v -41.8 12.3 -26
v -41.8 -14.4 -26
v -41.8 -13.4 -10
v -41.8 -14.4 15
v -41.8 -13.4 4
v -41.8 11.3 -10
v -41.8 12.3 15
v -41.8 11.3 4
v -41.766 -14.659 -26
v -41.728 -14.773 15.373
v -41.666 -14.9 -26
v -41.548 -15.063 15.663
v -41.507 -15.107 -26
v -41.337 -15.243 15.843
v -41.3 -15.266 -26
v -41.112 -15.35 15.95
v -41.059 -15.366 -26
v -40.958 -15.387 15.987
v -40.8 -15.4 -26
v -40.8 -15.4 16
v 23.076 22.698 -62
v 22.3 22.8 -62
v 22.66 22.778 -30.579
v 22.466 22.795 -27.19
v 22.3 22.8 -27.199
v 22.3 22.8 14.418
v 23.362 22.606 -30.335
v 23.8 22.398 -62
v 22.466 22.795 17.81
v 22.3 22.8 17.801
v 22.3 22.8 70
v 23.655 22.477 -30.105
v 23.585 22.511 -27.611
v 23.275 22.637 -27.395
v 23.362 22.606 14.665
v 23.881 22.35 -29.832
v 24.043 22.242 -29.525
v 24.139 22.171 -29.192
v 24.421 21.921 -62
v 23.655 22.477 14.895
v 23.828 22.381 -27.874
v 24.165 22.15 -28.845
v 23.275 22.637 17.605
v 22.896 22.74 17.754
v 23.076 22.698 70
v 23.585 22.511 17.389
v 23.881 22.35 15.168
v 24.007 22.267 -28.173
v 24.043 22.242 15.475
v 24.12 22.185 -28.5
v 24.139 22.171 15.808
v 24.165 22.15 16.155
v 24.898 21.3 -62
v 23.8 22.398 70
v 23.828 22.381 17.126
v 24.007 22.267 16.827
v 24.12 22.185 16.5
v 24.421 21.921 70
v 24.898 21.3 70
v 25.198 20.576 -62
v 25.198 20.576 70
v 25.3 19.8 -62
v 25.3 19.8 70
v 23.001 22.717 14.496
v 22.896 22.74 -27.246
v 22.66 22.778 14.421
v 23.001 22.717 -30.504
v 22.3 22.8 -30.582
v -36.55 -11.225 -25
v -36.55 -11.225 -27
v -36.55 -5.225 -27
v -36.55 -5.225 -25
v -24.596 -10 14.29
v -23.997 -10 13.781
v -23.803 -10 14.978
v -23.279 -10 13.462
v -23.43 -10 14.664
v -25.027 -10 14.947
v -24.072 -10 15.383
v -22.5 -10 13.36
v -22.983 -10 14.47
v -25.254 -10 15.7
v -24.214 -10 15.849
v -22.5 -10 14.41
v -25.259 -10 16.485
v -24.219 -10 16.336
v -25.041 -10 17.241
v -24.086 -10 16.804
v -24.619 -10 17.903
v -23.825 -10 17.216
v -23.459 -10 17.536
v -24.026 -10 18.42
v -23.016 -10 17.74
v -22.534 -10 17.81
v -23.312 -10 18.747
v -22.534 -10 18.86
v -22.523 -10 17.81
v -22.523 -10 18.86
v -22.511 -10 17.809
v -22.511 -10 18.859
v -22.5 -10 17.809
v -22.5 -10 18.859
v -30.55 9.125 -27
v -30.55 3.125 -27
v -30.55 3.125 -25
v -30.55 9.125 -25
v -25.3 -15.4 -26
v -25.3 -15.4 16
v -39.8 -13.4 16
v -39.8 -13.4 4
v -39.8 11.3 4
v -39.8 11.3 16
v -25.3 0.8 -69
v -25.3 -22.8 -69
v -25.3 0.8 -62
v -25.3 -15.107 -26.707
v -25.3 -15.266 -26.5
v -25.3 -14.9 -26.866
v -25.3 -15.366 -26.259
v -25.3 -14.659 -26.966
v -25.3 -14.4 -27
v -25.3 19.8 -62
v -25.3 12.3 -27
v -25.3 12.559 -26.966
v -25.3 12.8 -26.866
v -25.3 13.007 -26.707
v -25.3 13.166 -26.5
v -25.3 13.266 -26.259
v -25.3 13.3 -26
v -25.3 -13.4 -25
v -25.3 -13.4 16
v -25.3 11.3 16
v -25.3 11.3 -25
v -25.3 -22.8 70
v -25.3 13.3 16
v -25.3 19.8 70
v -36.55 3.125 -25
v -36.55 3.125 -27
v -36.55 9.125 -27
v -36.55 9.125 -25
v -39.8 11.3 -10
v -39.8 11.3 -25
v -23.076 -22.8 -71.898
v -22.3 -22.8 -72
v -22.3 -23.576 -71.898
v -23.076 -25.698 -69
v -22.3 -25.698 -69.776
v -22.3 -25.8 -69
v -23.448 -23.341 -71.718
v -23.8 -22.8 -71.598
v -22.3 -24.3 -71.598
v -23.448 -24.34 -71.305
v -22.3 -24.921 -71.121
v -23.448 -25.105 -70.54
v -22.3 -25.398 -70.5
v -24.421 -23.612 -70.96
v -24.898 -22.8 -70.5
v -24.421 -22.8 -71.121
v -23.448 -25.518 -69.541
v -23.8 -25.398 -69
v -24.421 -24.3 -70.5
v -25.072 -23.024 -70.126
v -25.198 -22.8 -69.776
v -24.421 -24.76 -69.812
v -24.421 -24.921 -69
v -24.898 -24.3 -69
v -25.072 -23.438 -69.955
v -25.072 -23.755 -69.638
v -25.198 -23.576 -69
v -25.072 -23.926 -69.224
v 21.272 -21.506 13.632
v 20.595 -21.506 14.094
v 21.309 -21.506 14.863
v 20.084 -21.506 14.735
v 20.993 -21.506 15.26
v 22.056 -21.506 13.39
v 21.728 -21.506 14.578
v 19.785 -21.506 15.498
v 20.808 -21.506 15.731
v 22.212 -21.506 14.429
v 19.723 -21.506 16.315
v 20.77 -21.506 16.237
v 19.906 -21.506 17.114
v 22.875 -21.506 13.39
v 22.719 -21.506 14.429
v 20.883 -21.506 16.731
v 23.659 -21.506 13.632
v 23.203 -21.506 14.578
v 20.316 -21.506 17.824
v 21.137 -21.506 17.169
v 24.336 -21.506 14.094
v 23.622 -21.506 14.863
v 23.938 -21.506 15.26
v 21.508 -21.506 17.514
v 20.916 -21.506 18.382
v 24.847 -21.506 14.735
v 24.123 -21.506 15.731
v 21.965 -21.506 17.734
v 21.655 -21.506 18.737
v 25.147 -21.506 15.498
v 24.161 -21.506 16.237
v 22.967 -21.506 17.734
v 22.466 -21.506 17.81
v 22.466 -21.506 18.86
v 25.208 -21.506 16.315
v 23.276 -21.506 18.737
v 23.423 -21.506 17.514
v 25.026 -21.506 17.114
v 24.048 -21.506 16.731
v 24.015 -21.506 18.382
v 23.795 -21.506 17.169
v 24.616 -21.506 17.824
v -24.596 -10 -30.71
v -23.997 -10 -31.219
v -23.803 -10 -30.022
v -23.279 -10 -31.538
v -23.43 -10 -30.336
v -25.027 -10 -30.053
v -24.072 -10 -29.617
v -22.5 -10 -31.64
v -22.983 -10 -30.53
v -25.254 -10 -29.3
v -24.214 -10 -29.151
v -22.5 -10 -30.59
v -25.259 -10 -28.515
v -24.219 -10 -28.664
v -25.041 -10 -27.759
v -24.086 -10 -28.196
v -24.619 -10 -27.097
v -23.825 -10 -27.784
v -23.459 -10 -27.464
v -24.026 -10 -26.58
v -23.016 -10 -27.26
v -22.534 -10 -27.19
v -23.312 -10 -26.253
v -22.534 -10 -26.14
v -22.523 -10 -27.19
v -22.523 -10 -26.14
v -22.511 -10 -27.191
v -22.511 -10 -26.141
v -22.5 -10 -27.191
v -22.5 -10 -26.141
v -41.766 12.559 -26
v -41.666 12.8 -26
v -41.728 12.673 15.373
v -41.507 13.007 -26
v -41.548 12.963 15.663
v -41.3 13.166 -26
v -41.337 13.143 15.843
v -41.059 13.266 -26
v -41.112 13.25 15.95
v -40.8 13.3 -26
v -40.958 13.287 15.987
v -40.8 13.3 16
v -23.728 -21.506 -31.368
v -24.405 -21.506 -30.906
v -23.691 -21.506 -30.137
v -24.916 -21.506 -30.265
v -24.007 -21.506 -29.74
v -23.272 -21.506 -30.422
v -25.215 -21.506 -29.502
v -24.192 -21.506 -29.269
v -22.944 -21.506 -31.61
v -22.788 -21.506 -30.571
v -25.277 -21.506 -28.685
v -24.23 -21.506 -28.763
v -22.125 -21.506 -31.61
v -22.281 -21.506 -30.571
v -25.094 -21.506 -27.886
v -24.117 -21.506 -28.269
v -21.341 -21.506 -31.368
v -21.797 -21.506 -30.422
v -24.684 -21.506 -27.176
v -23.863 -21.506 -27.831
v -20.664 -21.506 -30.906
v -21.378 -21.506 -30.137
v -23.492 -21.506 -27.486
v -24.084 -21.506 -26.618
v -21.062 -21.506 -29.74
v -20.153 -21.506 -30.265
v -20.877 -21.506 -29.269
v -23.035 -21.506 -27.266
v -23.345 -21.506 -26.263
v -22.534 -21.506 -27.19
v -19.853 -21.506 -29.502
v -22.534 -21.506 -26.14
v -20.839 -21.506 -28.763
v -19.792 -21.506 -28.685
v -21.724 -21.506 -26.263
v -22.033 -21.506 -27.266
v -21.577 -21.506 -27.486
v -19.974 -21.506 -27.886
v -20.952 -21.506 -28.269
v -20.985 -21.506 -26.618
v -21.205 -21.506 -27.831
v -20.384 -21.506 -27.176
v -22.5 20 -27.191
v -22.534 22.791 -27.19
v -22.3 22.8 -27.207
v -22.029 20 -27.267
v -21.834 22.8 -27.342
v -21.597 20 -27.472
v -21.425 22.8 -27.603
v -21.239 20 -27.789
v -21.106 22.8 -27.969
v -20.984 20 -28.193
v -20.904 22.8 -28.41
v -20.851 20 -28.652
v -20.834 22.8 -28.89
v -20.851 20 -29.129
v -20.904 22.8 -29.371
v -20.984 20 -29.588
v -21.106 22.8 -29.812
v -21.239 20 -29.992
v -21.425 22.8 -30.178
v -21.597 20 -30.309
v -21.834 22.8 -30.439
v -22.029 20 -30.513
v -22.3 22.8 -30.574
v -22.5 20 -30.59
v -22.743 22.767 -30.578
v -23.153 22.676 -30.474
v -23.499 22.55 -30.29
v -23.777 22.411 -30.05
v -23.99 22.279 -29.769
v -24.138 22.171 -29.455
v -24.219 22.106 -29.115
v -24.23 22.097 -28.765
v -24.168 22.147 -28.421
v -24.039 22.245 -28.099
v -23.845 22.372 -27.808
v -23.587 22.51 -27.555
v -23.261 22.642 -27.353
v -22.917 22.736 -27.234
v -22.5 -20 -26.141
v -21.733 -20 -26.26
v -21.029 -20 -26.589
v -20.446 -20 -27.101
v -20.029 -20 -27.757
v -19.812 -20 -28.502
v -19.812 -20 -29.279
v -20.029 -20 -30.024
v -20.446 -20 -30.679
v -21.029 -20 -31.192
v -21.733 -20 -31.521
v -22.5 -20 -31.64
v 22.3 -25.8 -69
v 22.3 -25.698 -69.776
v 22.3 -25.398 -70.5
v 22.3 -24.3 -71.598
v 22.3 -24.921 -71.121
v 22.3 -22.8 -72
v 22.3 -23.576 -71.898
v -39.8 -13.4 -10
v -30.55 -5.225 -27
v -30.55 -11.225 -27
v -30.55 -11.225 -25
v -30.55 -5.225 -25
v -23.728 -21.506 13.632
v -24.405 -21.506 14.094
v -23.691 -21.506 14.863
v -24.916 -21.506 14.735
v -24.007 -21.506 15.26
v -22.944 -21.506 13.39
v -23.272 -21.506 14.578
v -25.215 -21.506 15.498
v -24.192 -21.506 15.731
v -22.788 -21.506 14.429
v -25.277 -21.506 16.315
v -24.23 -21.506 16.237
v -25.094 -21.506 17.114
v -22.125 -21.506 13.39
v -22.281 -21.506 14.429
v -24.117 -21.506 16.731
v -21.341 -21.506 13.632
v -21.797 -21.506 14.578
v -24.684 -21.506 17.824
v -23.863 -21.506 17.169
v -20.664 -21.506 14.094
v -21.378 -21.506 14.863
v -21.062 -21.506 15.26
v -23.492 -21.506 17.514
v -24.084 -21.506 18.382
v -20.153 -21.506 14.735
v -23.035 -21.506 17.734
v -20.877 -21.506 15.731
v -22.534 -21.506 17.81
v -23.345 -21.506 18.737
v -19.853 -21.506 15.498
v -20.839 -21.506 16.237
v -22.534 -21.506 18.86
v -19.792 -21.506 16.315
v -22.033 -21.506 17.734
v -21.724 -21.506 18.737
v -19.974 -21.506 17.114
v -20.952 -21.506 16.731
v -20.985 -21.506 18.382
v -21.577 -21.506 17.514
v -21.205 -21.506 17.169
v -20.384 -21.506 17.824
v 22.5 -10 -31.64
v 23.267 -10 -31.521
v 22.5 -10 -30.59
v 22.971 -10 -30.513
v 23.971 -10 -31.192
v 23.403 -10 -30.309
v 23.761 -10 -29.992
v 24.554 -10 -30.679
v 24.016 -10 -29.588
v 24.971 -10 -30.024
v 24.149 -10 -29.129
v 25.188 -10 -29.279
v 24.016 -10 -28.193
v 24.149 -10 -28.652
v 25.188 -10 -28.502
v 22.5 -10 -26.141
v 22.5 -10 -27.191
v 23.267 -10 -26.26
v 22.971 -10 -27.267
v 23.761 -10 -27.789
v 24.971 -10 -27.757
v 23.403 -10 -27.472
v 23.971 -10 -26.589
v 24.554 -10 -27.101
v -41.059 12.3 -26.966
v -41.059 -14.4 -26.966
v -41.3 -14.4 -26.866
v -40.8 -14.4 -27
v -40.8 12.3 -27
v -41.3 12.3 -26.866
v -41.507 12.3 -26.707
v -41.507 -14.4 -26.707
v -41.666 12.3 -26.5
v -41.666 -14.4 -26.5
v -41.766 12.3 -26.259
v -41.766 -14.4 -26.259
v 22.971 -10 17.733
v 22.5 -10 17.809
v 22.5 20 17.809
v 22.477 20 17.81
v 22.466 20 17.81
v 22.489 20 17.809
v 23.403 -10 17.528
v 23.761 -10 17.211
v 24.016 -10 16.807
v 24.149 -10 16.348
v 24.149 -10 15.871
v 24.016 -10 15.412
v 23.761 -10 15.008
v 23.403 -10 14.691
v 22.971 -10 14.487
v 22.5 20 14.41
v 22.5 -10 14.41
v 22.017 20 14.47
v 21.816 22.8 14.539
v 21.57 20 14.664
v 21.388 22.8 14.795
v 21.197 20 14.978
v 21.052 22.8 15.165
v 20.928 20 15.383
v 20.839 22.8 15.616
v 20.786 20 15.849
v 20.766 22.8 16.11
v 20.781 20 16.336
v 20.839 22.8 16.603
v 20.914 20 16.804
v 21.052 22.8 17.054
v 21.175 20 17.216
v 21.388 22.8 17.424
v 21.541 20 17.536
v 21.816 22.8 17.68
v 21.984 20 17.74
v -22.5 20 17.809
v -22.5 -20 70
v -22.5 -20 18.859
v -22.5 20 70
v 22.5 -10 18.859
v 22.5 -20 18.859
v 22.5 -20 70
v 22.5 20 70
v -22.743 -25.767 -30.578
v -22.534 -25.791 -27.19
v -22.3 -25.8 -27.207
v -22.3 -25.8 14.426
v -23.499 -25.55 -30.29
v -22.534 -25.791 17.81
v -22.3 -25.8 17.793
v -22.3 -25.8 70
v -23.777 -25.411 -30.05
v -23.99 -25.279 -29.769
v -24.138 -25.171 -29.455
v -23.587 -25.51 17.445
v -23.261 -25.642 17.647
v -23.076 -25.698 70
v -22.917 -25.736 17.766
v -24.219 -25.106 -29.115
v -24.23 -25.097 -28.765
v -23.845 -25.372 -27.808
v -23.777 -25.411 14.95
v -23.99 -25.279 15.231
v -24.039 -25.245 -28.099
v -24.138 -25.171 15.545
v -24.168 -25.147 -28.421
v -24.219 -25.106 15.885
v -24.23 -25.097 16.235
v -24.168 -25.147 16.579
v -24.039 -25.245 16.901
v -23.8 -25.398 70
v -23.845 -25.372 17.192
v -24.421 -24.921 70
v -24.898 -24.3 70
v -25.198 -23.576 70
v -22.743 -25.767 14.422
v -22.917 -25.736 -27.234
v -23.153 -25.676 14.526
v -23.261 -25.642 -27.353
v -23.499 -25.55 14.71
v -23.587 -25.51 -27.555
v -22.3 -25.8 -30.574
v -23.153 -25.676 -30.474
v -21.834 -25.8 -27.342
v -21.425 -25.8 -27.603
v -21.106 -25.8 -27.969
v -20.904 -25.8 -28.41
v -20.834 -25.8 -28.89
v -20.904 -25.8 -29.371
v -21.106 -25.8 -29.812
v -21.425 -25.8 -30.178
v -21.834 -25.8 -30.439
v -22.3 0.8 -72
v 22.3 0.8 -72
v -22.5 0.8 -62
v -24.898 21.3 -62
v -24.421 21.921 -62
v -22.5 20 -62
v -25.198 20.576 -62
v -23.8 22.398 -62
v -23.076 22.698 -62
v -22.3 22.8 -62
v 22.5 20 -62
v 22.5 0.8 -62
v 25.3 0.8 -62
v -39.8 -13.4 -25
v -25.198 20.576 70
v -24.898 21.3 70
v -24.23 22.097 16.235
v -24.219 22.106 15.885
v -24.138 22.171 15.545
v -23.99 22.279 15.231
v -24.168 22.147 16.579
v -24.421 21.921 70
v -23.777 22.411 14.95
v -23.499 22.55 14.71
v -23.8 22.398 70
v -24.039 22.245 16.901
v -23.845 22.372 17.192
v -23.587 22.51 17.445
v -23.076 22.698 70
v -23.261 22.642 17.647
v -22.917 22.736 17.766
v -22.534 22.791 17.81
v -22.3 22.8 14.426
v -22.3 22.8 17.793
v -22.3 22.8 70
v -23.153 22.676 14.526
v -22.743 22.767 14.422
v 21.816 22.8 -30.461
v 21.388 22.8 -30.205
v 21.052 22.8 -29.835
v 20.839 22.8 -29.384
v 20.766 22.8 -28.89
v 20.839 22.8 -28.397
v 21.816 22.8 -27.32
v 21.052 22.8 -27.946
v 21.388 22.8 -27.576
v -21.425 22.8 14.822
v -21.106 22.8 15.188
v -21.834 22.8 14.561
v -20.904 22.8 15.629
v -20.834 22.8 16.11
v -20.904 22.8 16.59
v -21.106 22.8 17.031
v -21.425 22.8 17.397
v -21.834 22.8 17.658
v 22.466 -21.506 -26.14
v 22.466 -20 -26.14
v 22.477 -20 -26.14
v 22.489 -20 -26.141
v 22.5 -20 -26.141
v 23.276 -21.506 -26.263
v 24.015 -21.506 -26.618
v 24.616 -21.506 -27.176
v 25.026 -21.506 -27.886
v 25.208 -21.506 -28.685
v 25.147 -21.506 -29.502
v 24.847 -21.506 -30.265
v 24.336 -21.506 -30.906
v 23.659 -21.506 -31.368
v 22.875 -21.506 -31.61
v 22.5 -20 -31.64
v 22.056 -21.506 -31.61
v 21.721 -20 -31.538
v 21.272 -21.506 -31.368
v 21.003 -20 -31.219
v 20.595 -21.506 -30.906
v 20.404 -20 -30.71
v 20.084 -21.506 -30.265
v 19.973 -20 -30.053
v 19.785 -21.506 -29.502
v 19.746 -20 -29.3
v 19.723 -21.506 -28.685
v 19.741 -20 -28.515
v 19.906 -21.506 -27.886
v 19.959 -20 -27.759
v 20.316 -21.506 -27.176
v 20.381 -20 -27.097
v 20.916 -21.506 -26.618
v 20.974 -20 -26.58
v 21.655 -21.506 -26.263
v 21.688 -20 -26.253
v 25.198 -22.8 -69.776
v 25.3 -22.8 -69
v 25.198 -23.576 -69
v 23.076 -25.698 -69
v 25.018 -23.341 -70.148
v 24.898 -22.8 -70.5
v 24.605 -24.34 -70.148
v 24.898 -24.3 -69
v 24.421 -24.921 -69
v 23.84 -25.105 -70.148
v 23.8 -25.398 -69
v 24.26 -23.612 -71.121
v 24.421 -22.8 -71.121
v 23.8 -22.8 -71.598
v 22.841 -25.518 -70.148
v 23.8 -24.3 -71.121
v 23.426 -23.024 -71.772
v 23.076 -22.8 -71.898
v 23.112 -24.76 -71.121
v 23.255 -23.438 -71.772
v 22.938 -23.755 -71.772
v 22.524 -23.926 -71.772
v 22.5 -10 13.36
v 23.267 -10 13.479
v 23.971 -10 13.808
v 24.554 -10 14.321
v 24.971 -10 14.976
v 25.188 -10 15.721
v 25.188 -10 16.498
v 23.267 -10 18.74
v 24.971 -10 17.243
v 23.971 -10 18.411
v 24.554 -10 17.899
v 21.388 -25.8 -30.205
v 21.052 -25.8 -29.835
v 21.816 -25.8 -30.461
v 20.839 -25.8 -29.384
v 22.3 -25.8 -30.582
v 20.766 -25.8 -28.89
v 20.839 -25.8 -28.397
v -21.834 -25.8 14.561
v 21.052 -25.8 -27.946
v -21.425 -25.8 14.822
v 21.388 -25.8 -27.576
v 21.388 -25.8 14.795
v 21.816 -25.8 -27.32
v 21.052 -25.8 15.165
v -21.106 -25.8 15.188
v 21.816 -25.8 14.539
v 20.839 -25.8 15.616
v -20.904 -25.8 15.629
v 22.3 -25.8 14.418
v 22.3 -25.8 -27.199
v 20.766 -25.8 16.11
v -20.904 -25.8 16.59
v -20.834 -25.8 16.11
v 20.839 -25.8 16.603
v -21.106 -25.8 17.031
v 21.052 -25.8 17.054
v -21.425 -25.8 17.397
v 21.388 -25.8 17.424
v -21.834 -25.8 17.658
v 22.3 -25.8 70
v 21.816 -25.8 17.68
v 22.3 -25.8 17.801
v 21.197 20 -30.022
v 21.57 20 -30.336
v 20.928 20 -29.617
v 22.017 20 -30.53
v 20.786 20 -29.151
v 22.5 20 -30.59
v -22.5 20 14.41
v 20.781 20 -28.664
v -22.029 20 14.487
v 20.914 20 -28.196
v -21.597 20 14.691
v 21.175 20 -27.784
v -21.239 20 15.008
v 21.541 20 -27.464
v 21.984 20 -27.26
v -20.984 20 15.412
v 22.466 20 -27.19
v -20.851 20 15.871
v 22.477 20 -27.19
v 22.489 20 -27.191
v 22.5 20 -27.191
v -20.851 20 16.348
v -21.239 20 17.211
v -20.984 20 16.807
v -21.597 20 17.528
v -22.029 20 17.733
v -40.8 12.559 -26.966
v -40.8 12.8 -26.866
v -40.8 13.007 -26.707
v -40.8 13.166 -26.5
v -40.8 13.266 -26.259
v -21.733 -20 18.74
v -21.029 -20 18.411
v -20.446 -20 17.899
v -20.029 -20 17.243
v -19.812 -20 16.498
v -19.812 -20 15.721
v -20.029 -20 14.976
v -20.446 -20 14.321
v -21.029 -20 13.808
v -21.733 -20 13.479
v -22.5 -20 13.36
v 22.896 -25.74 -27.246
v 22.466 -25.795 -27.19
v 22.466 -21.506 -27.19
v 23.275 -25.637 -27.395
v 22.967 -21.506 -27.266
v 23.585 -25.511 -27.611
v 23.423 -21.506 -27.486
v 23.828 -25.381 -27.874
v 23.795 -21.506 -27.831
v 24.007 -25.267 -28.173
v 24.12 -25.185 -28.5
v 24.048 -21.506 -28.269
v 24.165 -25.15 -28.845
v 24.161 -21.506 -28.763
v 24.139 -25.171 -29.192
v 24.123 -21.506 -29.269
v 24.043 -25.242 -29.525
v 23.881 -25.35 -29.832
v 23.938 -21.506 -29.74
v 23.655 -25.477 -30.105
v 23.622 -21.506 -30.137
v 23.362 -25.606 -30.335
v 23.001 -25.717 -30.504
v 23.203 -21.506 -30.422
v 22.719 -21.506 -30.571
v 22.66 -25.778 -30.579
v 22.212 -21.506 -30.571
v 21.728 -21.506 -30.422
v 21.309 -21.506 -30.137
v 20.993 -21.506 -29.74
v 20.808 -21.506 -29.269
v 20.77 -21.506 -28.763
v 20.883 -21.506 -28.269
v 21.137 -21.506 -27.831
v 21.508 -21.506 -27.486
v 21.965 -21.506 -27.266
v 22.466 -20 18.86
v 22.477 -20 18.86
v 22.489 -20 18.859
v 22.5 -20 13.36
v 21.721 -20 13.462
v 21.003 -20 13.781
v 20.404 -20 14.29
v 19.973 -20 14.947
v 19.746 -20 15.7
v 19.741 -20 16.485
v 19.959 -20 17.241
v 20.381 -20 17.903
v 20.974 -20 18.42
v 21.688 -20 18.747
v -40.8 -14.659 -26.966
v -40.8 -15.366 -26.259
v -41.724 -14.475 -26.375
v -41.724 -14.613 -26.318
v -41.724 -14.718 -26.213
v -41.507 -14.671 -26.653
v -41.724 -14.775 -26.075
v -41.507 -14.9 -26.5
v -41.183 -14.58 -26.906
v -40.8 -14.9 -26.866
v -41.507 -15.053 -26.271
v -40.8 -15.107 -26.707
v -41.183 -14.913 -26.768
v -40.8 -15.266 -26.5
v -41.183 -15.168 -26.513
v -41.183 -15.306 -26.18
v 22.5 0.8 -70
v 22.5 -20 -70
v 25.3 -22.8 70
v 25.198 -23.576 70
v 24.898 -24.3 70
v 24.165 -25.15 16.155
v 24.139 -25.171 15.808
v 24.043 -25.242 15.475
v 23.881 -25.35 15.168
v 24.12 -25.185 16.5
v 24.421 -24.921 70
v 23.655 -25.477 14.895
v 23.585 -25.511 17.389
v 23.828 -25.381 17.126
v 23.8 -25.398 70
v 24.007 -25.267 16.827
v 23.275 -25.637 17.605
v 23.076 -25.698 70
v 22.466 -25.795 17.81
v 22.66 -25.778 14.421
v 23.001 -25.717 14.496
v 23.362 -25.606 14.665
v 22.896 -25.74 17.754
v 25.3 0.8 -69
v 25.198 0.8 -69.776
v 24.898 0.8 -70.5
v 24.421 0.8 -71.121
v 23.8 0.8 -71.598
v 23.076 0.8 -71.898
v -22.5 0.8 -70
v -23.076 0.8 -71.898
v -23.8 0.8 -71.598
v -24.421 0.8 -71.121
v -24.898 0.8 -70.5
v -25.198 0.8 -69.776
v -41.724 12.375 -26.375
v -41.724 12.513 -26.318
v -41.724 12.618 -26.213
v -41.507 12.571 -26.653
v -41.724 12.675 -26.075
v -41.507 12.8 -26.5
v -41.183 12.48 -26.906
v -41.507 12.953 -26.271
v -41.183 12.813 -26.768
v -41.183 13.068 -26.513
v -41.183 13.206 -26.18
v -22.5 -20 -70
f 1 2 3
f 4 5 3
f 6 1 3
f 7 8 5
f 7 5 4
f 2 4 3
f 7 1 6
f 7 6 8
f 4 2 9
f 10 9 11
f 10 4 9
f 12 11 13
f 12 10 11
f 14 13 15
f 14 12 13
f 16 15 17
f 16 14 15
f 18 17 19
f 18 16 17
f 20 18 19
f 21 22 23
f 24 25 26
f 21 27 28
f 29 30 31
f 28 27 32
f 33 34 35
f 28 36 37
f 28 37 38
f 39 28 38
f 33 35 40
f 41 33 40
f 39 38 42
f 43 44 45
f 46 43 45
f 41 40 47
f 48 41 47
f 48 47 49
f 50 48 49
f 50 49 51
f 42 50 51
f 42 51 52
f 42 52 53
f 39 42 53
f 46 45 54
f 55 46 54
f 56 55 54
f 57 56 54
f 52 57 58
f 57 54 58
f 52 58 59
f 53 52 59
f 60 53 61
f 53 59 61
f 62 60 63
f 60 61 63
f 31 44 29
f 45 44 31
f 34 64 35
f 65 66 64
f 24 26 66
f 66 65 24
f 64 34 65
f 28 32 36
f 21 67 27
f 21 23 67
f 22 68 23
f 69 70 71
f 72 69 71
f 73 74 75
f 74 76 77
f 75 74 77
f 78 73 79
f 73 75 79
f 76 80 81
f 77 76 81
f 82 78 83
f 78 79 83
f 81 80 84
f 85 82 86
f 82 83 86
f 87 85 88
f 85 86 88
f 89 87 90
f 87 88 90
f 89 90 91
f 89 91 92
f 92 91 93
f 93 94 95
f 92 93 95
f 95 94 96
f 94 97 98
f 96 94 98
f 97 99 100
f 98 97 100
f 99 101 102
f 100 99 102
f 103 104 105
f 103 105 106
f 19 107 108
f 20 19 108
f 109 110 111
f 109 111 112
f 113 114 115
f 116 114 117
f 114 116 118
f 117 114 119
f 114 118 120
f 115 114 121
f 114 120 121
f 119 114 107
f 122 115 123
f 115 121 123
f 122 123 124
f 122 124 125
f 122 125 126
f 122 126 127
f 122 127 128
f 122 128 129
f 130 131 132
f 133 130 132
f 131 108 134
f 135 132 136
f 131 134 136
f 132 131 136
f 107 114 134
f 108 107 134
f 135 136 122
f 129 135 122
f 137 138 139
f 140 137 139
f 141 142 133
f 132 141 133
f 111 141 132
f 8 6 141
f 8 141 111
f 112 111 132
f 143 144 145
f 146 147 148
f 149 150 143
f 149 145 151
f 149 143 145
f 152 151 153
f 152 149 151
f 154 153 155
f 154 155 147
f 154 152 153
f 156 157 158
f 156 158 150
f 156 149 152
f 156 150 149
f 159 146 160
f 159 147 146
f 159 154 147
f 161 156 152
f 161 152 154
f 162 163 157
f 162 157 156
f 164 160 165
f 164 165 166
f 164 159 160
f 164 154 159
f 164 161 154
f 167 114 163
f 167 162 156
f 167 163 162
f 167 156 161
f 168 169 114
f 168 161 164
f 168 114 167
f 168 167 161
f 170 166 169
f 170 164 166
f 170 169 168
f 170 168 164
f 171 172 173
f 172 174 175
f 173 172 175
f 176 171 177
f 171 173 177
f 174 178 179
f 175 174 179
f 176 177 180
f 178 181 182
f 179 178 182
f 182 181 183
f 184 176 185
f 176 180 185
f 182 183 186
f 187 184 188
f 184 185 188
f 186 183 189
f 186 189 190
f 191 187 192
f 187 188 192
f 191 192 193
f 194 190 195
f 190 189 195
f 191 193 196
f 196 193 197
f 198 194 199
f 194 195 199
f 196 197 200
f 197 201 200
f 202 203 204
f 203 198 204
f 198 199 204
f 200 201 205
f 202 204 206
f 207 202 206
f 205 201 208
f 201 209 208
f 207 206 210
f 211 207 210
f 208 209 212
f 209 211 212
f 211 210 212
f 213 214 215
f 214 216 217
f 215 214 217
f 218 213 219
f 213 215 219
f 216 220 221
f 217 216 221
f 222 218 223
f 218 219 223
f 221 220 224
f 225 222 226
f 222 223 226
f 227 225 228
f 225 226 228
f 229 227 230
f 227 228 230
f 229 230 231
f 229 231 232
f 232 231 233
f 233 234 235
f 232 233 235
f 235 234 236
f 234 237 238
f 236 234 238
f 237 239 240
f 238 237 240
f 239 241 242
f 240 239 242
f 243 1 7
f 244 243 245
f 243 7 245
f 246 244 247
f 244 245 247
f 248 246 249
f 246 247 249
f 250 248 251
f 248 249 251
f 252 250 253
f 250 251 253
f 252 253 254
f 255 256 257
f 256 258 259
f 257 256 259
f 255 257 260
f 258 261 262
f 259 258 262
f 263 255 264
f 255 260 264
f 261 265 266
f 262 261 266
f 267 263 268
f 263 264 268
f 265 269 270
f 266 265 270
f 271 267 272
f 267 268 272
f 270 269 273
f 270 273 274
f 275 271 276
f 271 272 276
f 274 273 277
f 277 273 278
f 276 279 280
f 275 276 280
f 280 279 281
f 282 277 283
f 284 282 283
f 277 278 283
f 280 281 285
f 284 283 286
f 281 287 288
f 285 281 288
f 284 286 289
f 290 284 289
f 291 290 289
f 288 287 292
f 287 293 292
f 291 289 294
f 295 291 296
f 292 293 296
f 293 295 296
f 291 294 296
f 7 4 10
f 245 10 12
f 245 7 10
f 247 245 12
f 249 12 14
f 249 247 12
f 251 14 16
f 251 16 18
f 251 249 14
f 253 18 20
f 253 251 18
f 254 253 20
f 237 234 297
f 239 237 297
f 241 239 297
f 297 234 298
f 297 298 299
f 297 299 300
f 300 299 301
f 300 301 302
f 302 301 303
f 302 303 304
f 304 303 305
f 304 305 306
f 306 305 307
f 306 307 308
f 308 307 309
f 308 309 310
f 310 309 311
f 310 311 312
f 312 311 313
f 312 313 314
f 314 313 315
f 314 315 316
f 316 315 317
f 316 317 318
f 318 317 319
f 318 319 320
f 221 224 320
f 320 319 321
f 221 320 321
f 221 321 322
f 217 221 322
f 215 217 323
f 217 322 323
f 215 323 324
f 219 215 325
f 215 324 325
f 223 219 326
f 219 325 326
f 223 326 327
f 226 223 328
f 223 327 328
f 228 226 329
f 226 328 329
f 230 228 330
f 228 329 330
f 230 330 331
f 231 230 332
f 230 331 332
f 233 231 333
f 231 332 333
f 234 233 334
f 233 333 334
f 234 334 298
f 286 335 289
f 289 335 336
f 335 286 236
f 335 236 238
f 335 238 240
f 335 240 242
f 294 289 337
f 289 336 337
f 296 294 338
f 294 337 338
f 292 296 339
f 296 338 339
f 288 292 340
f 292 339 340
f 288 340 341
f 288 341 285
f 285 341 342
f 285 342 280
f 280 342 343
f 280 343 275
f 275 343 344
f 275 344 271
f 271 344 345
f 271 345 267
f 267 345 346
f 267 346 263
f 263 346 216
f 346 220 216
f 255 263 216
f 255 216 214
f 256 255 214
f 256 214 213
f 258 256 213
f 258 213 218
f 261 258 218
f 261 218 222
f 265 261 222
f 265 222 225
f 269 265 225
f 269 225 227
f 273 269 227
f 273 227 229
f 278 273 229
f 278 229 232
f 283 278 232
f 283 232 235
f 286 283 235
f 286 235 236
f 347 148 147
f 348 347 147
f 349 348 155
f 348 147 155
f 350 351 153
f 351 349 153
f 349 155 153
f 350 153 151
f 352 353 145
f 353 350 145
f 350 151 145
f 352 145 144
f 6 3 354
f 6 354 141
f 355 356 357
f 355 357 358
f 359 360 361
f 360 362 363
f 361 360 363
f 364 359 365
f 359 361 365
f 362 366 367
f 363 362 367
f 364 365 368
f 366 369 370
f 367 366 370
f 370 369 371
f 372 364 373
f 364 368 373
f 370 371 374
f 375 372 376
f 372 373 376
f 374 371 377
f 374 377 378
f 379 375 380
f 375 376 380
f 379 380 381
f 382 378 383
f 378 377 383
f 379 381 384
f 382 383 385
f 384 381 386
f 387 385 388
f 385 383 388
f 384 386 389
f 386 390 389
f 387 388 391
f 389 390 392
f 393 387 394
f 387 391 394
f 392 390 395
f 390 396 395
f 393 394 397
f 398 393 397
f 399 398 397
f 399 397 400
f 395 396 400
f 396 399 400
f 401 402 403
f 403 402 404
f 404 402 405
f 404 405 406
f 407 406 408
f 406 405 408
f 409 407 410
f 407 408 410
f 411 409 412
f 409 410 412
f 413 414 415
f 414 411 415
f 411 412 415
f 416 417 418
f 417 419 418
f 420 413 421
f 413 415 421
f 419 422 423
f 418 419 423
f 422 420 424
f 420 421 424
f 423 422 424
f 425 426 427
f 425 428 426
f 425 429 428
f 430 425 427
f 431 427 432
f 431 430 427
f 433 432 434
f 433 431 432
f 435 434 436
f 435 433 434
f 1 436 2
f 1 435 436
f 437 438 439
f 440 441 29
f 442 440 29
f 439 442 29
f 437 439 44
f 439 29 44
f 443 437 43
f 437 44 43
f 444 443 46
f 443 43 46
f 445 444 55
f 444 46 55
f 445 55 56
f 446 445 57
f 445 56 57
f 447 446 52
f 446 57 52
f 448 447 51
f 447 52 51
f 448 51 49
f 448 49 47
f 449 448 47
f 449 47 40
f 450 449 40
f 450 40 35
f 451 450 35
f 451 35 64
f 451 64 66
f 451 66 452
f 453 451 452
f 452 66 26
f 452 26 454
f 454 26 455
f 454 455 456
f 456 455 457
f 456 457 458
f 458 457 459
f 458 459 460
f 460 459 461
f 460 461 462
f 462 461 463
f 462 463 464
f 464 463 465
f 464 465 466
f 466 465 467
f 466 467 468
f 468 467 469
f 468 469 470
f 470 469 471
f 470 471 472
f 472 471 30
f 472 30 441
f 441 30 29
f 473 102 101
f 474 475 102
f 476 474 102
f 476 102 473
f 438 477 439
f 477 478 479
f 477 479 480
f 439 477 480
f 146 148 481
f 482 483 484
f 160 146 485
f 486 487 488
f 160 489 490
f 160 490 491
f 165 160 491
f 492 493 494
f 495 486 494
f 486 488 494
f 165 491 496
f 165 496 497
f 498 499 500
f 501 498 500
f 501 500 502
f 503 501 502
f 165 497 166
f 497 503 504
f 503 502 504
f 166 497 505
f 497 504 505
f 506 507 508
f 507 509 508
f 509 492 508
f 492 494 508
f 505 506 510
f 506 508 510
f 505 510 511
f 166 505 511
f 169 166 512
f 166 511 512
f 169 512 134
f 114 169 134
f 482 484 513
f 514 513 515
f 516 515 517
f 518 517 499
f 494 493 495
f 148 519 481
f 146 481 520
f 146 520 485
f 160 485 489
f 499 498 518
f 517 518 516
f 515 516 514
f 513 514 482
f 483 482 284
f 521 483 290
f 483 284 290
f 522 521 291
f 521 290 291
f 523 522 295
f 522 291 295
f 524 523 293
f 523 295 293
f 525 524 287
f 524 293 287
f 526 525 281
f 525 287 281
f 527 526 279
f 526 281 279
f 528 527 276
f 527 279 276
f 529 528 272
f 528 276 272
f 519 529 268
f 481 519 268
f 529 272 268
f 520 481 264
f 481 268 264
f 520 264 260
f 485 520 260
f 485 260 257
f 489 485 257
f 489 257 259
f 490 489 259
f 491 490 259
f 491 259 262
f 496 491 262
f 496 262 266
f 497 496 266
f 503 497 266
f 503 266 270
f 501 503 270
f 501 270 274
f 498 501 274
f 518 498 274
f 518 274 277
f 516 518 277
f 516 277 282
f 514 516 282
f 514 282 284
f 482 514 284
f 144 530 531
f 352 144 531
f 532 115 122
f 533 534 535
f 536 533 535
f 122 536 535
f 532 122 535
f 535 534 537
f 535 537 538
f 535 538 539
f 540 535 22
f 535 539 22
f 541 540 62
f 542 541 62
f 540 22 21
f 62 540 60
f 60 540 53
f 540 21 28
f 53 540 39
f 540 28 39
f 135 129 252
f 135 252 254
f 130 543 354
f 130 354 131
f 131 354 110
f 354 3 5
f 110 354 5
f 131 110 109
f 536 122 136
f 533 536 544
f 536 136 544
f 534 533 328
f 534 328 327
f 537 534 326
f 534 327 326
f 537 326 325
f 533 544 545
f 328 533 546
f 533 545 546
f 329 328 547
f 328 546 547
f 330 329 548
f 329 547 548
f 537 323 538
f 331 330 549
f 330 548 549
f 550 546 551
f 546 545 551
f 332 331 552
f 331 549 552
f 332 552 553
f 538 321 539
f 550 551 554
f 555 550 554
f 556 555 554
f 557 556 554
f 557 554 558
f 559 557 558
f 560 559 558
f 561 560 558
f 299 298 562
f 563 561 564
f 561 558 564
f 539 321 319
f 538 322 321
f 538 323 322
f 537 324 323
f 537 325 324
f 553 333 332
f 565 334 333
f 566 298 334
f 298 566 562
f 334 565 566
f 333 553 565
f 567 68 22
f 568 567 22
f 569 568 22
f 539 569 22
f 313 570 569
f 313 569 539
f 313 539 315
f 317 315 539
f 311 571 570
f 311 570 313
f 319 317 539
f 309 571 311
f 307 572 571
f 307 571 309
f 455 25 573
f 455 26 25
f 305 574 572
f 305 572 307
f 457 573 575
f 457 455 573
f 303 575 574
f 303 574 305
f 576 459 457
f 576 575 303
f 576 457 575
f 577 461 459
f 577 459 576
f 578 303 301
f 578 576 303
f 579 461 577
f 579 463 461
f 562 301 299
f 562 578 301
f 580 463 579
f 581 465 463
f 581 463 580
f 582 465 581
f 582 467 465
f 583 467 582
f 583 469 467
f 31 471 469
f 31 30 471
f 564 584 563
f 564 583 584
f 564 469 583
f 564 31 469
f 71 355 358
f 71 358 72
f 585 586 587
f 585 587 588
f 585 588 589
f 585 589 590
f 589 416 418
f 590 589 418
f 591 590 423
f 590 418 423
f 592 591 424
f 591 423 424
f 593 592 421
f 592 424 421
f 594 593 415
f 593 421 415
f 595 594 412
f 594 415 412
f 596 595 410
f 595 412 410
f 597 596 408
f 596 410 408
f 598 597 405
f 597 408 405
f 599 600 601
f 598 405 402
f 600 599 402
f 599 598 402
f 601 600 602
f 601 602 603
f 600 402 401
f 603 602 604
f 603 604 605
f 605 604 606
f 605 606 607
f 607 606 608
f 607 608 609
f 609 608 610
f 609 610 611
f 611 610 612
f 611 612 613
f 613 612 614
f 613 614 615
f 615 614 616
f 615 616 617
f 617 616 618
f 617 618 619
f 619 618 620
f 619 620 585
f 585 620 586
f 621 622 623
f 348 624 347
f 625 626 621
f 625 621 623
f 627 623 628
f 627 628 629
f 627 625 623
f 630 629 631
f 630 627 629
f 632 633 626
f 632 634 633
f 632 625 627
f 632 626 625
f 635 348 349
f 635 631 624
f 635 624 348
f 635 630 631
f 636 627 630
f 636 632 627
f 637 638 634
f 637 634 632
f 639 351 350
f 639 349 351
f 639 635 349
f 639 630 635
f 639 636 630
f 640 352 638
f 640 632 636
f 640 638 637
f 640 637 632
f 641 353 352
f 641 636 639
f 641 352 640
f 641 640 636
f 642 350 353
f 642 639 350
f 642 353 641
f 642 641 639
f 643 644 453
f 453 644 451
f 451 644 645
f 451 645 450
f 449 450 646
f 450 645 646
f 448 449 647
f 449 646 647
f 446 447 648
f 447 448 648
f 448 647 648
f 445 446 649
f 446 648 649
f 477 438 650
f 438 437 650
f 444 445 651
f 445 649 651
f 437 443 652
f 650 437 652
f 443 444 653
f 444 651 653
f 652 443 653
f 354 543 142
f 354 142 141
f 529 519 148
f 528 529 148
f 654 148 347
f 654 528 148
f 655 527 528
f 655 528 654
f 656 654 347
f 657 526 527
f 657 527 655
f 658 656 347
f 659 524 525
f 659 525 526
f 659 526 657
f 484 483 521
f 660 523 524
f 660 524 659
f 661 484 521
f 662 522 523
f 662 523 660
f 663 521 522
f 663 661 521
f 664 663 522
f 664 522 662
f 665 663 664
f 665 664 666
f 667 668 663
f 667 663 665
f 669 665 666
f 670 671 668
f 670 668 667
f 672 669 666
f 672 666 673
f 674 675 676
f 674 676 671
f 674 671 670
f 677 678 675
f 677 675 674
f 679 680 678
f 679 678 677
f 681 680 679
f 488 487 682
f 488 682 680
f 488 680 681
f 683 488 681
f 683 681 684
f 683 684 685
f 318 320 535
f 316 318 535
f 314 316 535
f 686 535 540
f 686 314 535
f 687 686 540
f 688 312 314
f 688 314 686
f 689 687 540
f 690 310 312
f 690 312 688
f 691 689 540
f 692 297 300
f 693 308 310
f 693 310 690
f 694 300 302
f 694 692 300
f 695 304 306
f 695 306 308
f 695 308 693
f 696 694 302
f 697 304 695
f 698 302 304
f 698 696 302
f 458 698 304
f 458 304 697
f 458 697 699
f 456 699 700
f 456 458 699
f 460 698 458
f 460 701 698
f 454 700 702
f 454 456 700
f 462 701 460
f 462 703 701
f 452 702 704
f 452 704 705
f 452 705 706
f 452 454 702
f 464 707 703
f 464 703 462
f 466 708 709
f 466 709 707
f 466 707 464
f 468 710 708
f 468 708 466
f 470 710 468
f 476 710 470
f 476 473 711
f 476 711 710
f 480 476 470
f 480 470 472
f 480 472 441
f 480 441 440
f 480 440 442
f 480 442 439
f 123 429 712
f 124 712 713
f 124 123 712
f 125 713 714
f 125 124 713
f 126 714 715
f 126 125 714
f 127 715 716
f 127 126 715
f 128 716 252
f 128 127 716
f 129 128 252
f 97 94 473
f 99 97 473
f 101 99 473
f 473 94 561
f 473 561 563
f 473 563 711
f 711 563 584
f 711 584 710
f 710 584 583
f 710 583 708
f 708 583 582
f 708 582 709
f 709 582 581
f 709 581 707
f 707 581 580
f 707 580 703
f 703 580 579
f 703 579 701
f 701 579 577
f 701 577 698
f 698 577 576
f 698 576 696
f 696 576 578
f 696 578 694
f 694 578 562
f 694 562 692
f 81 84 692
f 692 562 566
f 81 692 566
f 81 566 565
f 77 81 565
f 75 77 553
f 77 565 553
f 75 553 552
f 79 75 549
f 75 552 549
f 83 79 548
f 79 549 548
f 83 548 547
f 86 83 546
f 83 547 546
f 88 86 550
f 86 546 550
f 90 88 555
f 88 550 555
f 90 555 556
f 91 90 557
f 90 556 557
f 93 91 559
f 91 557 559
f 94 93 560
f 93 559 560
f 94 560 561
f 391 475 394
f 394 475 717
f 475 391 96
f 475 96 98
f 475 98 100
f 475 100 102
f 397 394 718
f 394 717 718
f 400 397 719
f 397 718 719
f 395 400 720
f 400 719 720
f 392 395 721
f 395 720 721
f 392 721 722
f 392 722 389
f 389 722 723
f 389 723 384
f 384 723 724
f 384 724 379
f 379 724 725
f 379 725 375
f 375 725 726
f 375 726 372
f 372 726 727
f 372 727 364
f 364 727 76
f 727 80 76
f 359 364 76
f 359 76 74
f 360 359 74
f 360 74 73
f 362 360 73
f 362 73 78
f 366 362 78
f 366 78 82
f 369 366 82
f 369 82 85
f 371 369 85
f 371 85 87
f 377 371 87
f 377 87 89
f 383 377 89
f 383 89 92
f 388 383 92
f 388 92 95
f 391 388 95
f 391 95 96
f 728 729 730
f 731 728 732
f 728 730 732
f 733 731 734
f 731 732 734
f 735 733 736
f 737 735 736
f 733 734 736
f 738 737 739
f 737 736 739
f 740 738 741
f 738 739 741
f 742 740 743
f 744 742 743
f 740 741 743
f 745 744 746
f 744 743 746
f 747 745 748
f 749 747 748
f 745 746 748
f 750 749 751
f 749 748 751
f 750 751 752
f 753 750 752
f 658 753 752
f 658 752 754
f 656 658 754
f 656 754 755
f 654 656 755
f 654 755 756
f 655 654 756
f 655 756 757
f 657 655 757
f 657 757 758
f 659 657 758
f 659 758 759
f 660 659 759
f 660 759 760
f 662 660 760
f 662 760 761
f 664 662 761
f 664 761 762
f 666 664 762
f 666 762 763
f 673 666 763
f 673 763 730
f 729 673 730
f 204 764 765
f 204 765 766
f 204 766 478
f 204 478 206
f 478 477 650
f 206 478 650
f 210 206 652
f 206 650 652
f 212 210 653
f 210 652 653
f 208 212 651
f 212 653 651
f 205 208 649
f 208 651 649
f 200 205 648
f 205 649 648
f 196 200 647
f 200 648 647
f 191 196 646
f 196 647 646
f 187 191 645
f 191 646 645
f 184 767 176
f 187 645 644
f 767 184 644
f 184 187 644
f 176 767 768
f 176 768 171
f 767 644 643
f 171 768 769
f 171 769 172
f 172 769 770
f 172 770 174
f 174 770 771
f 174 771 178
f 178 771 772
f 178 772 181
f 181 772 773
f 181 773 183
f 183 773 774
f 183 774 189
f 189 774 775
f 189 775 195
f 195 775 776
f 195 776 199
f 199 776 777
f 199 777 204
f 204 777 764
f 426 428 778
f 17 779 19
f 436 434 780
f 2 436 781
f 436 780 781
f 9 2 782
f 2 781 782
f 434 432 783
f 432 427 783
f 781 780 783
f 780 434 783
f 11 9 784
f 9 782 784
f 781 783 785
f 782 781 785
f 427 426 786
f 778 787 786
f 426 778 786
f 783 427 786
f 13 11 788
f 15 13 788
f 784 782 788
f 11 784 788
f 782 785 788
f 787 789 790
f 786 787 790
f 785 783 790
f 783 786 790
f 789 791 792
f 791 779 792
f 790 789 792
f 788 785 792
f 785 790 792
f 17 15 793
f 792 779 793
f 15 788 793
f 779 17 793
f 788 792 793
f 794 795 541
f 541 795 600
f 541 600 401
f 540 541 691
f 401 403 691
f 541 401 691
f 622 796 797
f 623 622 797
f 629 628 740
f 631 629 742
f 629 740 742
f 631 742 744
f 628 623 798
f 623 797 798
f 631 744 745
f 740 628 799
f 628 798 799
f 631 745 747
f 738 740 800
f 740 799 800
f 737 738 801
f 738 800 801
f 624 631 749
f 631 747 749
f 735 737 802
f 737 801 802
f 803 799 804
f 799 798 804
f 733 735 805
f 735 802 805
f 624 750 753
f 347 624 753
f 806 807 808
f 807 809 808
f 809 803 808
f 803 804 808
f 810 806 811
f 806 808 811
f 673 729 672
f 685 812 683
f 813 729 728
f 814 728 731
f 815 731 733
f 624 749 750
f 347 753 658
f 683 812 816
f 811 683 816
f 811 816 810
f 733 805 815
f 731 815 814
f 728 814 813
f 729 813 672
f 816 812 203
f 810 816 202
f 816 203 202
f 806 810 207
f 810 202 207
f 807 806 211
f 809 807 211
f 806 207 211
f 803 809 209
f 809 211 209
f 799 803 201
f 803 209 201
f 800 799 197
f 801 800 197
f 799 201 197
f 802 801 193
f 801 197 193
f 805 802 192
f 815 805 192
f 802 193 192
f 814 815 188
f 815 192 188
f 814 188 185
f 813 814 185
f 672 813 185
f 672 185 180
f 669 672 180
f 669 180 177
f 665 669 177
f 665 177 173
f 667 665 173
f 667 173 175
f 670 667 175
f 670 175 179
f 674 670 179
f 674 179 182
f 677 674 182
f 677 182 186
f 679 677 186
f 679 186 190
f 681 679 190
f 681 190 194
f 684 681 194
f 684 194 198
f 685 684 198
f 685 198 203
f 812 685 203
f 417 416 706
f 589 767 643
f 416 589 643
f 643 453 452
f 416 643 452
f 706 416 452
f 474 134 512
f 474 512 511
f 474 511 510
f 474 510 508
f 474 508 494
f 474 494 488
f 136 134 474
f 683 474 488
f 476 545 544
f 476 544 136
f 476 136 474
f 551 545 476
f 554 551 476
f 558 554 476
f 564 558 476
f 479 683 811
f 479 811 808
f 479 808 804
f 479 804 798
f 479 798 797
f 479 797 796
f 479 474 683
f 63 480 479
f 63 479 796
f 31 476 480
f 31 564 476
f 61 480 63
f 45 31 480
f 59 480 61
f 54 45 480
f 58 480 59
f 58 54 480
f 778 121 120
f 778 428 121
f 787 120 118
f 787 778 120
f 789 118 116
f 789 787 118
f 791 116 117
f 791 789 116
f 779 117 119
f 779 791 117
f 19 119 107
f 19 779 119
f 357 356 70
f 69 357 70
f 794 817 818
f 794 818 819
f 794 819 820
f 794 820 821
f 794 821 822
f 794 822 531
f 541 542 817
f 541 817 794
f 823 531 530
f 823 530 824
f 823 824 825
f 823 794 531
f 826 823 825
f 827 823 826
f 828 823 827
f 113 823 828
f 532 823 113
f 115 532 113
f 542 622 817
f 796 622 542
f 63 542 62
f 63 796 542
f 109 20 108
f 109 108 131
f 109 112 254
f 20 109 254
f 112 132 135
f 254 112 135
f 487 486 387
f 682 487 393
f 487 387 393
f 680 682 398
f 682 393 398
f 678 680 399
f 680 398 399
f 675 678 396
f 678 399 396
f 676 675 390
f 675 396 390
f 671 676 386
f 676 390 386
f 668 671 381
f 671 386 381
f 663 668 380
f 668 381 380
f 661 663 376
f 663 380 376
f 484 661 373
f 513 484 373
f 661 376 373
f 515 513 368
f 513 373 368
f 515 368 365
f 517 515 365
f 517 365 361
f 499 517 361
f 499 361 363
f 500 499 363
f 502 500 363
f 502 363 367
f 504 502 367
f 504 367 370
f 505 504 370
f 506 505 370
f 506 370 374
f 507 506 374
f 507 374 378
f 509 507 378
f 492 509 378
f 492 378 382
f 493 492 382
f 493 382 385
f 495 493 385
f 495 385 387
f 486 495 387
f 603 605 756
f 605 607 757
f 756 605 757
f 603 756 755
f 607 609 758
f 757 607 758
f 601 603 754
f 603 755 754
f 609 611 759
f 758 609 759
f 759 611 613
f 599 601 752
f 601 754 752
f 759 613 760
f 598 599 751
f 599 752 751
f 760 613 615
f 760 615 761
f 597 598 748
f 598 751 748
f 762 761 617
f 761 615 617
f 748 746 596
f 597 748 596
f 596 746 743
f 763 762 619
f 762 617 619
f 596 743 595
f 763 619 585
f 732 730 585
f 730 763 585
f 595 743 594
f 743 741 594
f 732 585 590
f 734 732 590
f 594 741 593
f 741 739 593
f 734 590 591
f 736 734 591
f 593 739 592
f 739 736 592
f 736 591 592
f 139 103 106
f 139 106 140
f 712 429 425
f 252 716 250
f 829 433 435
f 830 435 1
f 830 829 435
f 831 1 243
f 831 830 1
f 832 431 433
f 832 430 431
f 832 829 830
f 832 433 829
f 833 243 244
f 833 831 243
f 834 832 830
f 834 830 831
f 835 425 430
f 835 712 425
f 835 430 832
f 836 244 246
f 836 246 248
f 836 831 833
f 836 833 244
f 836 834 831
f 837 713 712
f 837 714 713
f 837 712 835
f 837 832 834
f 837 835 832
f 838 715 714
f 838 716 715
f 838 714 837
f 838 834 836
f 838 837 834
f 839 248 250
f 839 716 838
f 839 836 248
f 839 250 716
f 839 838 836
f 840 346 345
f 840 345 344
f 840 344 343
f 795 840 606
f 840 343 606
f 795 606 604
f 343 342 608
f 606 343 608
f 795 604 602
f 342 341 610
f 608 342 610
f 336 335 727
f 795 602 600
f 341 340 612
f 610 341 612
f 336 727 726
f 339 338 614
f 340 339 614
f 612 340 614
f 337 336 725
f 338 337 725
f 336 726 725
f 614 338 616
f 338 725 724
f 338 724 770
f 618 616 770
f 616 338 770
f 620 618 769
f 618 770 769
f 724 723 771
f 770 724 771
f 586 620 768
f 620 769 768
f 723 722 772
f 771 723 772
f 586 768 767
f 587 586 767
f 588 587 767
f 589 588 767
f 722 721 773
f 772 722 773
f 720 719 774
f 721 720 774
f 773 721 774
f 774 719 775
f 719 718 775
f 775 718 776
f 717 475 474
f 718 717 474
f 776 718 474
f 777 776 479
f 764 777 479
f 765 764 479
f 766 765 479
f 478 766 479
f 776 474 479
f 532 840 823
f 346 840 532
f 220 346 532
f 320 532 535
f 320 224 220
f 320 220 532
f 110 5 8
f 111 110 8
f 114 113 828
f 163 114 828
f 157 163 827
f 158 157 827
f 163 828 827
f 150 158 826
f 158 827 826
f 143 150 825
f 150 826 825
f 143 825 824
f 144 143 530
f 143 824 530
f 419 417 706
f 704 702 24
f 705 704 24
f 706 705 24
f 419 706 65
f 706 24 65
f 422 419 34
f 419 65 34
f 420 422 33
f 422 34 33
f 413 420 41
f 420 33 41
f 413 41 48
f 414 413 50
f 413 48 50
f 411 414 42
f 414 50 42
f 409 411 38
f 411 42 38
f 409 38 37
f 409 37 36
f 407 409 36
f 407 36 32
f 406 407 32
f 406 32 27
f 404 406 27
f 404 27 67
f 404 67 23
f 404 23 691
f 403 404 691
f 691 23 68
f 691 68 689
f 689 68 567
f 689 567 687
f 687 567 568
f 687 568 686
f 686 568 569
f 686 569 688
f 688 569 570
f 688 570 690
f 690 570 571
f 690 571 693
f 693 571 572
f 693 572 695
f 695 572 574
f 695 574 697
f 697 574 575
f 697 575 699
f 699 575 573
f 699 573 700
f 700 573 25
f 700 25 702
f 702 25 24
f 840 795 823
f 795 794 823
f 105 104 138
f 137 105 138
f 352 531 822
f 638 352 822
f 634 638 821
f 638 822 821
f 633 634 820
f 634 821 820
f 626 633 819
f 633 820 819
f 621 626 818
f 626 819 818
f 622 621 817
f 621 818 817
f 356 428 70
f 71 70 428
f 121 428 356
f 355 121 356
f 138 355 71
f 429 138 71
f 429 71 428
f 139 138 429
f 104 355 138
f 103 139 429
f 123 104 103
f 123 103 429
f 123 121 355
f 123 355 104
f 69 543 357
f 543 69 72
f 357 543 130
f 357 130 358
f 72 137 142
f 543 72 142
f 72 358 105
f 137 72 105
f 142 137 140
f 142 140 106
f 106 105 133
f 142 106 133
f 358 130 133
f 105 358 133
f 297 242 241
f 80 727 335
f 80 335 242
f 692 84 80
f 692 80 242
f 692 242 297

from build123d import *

# Parameters (mm, degrees)
SKETCH1_W           = 50.6
SKETCH1_H           = 45.6
SKETCH1_W_2         = 45
SKETCH1_H_2         = 40
BOSS_EXTRUDE1_DEPTH = 70
SKETCH2_W           = 50.6
SKETCH2_H           = 45.6
BOSS_EXTRUDE2_DEPTH = 2
SKETCH4_R           = 1.7
CUT_EXTRUDE1_DEPTH  = 71.5
SKETCH5_R           = 2.75
CUT_EXTRUDE2_DEPTH  = 12.5
SKETCH6_W           = 50.6
SKETCH6_H           = 4.293520681
BOSS_EXTRUDE3_DEPTH = 142
SKETCH7_R           = 1.7
CUT_EXTRUDE3_DEPTH  = 7.5
FILLET1_R           = 3
CUT_EXTRUDE4_DEPTH  = 22
BOSS_EXTRUDE4_DEPTH = 14.5
SKETCH10_W          = 43
SKETCH10_H          = 28.7
BOSS_EXTRUDE5_DEPTH = 2
SKETCH11_W          = 14
SKETCH11_H          = 24.7
CUT_EXTRUDE5_DEPTH  = 2
SKETCH12_W          = 6
SKETCH12_H          = 6
CUT_EXTRUDE6_DEPTH  = 2
FILLET2_R           = 1


with BuildPart() as part:
    # Sketch1 → Boss-Extrude1 (new, symmetric)
    with BuildSketch(Plane.XY):
        Rectangle(SKETCH1_W, SKETCH1_H)
        Rectangle(SKETCH1_W_2, SKETCH1_H_2, mode=Mode.SUBTRACT)
    extrude(amount=BOSS_EXTRUDE1_DEPTH, both=True)

    # Sketch2 → Boss-Extrude2 (add)
    with BuildSketch(Plane(origin=(0, 0, -70), x_dir=(-1, 0, 0), z_dir=(0, 0, -1))):
        Rectangle(SKETCH2_W, SKETCH2_H)
    extrude(amount=BOSS_EXTRUDE2_DEPTH)

    # Sketch4 → Cut-Extrude1 (cut)
    with BuildSketch(Plane(origin=(0, 22.8, 0), x_dir=(1, 0, 0), z_dir=(0, 1, 0))):
        with Locations(Location((-22.534370918, 28.890457594, 0), (0, 0, 270))):
            Circle(SKETCH4_R)
        with Locations(Location((22.465629082, 28.890457594, 0), (0, 0, 270))):
            Circle(SKETCH4_R)
        with Locations(Location((22.465629082, -16.109542406, 0), (0, 0, 270))):
            Circle(SKETCH4_R)
        with Locations(Location((-22.534370918, -16.109542406, 0), (0, 0, 270))):
            Circle(SKETCH4_R)
    extrude(amount=-CUT_EXTRUDE1_DEPTH, mode=Mode.SUBTRACT)

    # Sketch5 → Cut-Extrude2 (cut)
    with BuildSketch(Plane(origin=(0, -10, 0), x_dir=(1, 0, 0), z_dir=(0, 1, 0))):
        with Locations(Location((22.465629082, 28.890457594, 0), (0, 0, 270))):
            Circle(SKETCH5_R)
        with Locations(Location((22.465629082, -16.109542406, 0), (0, 0, 270))):
            Circle(SKETCH5_R)
        with Locations(Location((-22.534370918, 28.890457594, 0), (0, 0, 270))):
            Circle(SKETCH5_R)
        with Locations(Location((-22.534370918, -16.109542406, 0), (0, 0, 270))):
            Circle(SKETCH5_R)
    extrude(amount=-CUT_EXTRUDE2_DEPTH, mode=Mode.SUBTRACT)

    # Sketch6 → Boss-Extrude3 (add)
    with BuildSketch(Plane.XY.offset(70)):
        with Locations((0, -23.65323966)):
            Rectangle(SKETCH6_W, SKETCH6_H)
    extrude(amount=-BOSS_EXTRUDE3_DEPTH)

    # Sketch7 → Cut-Extrude3 (cut)
    with BuildSketch(Plane(origin=(0, -21.506479319, 0), x_dir=(1, 0, 0), z_dir=(0, 1, 0))):
        with Locations(Location((-22.534370918, 28.890457594, 0), (0, 0, 270))):
            Circle(SKETCH7_R)
        with Locations(Location((22.465629082, 28.890457594, 0), (0, 0, 270))):
            Circle(SKETCH7_R)
        with Locations(Location((22.465629082, -16.109542406, 0), (0, 0, 270))):
            Circle(SKETCH7_R)
        with Locations(Location((-22.534370918, -16.109542406, 0), (0, 0, 270))):
            Circle(SKETCH7_R)
    extrude(amount=-CUT_EXTRUDE3_DEPTH, mode=Mode.SUBTRACT)

    # Fillet1
    # the kernel refuses this fillet: 3 mm, written as the material it takes off along each edge
    with BuildSketch(Plane(origin=(-22.3, -22.8, -69), x_dir=(0, 0, -1), z_dir=(-1, 0, 0))) as fillet1_piece_1_section:
        Polygon((0, 0), (FILLET1_R, 0), (FILLET1_R, FILLET1_R), (0, FILLET1_R), align=None)
    fillet1_piece_1 = extrude(amount=FILLET1_R, mode=Mode.PRIVATE)
    fillet1_piece_1 = fillet1_piece_1 - Plane(origin=(-22.3, -22.8, -69), x_dir=(-2.085182079516792e-15, 0.7071067811865475, 0.7071067811865475), z_dir=(-1, 0, 0)) * Sphere(FILLET1_R, mode=Mode.PRIVATE)
    add(fillet1_piece_1, mode=Mode.SUBTRACT)
    with BuildSketch(Plane(origin=(22.3, -22.8, -69), x_dir=(0, -1, 0), z_dir=(0, 0, -1))) as fillet1_piece_2_section:
        Polygon((0, 0), (FILLET1_R, 0), (FILLET1_R, -FILLET1_R), (0, -FILLET1_R), align=None)
    fillet1_piece_2 = extrude(amount=FILLET1_R, mode=Mode.PRIVATE)
    fillet1_piece_2 = fillet1_piece_2 - Plane(origin=(22.3, -22.8, -69), x_dir=(-0.7071067811865486, 0.7071067811865464, 0), z_dir=(0, 0, -1)) * Sphere(FILLET1_R, mode=Mode.PRIVATE)
    add(fillet1_piece_2, mode=Mode.SUBTRACT)
    with BuildSketch(Plane(origin=(22.3, 19.8, -69), x_dir=(0, 0, -1), z_dir=(0, 1, 0))) as fillet1_piece_3_section:
        Polygon((0, 0), (FILLET1_R, 0), (FILLET1_R, -FILLET1_R), (0, -FILLET1_R), align=None)
    fillet1_piece_3 = extrude(amount=FILLET1_R, mode=Mode.PRIVATE)
    fillet1_piece_3 = fillet1_piece_3 - Plane(origin=(22.3, 19.8, -69), x_dir=(-0.7071067811865475, 0, 0.7071067811865475), z_dir=(0, 1, 0)) * Sphere(FILLET1_R, mode=Mode.PRIVATE)
    add(fillet1_piece_3, mode=Mode.SUBTRACT)
    with BuildSketch(Plane(origin=(-22.3, 19.8, -69), x_dir=(0, 1, 0), z_dir=(-1, 0, 0))) as fillet1_piece_4_section:
        Polygon((0, 0), (FILLET1_R, 0), (FILLET1_R, FILLET1_R), (0, FILLET1_R), align=None)
    fillet1_piece_4 = extrude(amount=FILLET1_R, mode=Mode.PRIVATE)
    fillet1_piece_4 = fillet1_piece_4 - Plane(origin=(-22.3, 19.8, -69), x_dir=(0, -0.7071067811865475, 0.7071067811865475), z_dir=(-1, 0, 0)) * Sphere(FILLET1_R, mode=Mode.PRIVATE)
    add(fillet1_piece_4, mode=Mode.SUBTRACT)
    with BuildSketch(Plane(origin=(-25.3, -25.8, 77.5), x_dir=(0, 1, 0), z_dir=(0, 0, -1)), Plane(origin=(25.3, -25.8, 77.5), x_dir=(-1, 0, 0), z_dir=(0, 0, -1))) as fillet1_piece_5:
        with BuildLine():
            CenterArc((FILLET1_R, FILLET1_R), FILLET1_R, 180, 90)
            Line((0, FILLET1_R), (0, 0))
            Line((0, 0), (FILLET1_R, 0))
        make_face()
    extrude(amount=146.5, mode=Mode.SUBTRACT)
    with BuildSketch(Plane(origin=(-22.3, -25.8, -72), x_dir=(0, 1, 0), z_dir=(1, 0, 0))) as fillet1_piece_6:
        with BuildLine():
            CenterArc((FILLET1_R, FILLET1_R), FILLET1_R, 180, 90)
            Line((0, FILLET1_R), (0, 0))
            Line((0, 0), (FILLET1_R, 0))
        make_face()
    extrude(amount=44.6, mode=Mode.SUBTRACT)
    with BuildSketch(Plane(origin=(25.3, 19.8, -72), x_dir=(-1, 0, 0), z_dir=(0, -1, 0)), Plane(origin=(-25.3, 19.8, -72), x_dir=(0, 0, 1), z_dir=(0, -1, 0))) as fillet1_piece_7:
        with BuildLine():
            CenterArc((FILLET1_R, -FILLET1_R), FILLET1_R, 90, 90)
            Line((0, -FILLET1_R), (0, 0))
            Line((0, 0), (FILLET1_R, 0))
        make_face()
    extrude(amount=42.6, mode=Mode.SUBTRACT)
    with BuildSketch(Plane(origin=(22.3, 22.8, -72), x_dir=(0, 0, 1), z_dir=(-1, 0, 0))) as fillet1_piece_8:
        with BuildLine():
            CenterArc((FILLET1_R, -FILLET1_R), FILLET1_R, 90, 90)
            Line((0, -FILLET1_R), (0, 0))
            Line((0, 0), (FILLET1_R, 0))
        make_face()
    extrude(amount=44.6, mode=Mode.SUBTRACT)
    with BuildSketch(Plane(origin=(25.3, 22.8, 77.5), x_dir=(-1, 0, 0), z_dir=(0, 0, -1)), Plane(origin=(-25.3, 22.8, 77.5), x_dir=(0, -1, 0), z_dir=(0, 0, -1))) as fillet1_piece_9:
        with BuildLine():
            CenterArc((FILLET1_R, -FILLET1_R), FILLET1_R, 90, 90)
            Line((0, -FILLET1_R), (0, 0))
            Line((0, 0), (FILLET1_R, 0))
        make_face()
    extrude(amount=146.5, mode=Mode.SUBTRACT)

    # Sketch8 → Cut-Extrude4 (cut)
    with BuildSketch(Plane.XZ.offset(-22.8)):
        Polygon((-25.3, -62), (25.3, -62), (25.3, -72), (25.3, -74.989483602), (-25.3, -74.989483602), align=None)
    extrude(amount=CUT_EXTRUDE4_DEPTH, mode=Mode.SUBTRACT)

    # Sketch9 → Boss-Extrude4 (add)
    with BuildSketch(Plane.ZY.offset(25.3)):
        Polygon((-25, 11.3), (16, 11.3), (16, 13.3), (-27, 13.3), (-27, -15.4), (16, -15.4), (16, -13.4), (-25, -13.4), align=None)
    extrude(amount=BOSS_EXTRUDE4_DEPTH)

    # Sketch10 → Boss-Extrude5 (add)
    with BuildSketch(Plane.ZY.offset(39.8)):
        with Locations((-5.5, -1.05)):
            Rectangle(SKETCH10_W, SKETCH10_H)
    extrude(amount=BOSS_EXTRUDE5_DEPTH)

    # Sketch11 → Cut-Extrude5 (cut)
    with BuildSketch(Plane.ZY.offset(41.8)):
        with Locations((-3, -1.05)):
            Rectangle(SKETCH11_W, SKETCH11_H)
    extrude(amount=-CUT_EXTRUDE5_DEPTH, mode=Mode.SUBTRACT)

    # Sketch12 → Cut-Extrude6 (cut)
    with BuildSketch(Plane(origin=(0, 0, -27), x_dir=(-1, 0, 0), z_dir=(0, 0, -1))):
        with Locations((33.55, 6.125)):
            Rectangle(SKETCH12_W, SKETCH12_H)
        with Locations((33.55, -8.225)):
            Rectangle(SKETCH12_W, SKETCH12_H)
    extrude(amount=-CUT_EXTRUDE6_DEPTH, mode=Mode.SUBTRACT)

    # Fillet2
    fillet2_edges = [part.edges().sort_by_distance(p)[0] for p in [
        (-33.55, 13.3, -27),
        (-33.55, -15.4, -27),
        (-41.8, -1.05, -27),
        (-41.8, -15.4, -5.5),
        (-41.8, -1.05, 16),
        (-41.8, 13.3, -5.5),
    ]]
    fillet(fillet2_edges, radius=FILLET2_R)


solid = part.part
